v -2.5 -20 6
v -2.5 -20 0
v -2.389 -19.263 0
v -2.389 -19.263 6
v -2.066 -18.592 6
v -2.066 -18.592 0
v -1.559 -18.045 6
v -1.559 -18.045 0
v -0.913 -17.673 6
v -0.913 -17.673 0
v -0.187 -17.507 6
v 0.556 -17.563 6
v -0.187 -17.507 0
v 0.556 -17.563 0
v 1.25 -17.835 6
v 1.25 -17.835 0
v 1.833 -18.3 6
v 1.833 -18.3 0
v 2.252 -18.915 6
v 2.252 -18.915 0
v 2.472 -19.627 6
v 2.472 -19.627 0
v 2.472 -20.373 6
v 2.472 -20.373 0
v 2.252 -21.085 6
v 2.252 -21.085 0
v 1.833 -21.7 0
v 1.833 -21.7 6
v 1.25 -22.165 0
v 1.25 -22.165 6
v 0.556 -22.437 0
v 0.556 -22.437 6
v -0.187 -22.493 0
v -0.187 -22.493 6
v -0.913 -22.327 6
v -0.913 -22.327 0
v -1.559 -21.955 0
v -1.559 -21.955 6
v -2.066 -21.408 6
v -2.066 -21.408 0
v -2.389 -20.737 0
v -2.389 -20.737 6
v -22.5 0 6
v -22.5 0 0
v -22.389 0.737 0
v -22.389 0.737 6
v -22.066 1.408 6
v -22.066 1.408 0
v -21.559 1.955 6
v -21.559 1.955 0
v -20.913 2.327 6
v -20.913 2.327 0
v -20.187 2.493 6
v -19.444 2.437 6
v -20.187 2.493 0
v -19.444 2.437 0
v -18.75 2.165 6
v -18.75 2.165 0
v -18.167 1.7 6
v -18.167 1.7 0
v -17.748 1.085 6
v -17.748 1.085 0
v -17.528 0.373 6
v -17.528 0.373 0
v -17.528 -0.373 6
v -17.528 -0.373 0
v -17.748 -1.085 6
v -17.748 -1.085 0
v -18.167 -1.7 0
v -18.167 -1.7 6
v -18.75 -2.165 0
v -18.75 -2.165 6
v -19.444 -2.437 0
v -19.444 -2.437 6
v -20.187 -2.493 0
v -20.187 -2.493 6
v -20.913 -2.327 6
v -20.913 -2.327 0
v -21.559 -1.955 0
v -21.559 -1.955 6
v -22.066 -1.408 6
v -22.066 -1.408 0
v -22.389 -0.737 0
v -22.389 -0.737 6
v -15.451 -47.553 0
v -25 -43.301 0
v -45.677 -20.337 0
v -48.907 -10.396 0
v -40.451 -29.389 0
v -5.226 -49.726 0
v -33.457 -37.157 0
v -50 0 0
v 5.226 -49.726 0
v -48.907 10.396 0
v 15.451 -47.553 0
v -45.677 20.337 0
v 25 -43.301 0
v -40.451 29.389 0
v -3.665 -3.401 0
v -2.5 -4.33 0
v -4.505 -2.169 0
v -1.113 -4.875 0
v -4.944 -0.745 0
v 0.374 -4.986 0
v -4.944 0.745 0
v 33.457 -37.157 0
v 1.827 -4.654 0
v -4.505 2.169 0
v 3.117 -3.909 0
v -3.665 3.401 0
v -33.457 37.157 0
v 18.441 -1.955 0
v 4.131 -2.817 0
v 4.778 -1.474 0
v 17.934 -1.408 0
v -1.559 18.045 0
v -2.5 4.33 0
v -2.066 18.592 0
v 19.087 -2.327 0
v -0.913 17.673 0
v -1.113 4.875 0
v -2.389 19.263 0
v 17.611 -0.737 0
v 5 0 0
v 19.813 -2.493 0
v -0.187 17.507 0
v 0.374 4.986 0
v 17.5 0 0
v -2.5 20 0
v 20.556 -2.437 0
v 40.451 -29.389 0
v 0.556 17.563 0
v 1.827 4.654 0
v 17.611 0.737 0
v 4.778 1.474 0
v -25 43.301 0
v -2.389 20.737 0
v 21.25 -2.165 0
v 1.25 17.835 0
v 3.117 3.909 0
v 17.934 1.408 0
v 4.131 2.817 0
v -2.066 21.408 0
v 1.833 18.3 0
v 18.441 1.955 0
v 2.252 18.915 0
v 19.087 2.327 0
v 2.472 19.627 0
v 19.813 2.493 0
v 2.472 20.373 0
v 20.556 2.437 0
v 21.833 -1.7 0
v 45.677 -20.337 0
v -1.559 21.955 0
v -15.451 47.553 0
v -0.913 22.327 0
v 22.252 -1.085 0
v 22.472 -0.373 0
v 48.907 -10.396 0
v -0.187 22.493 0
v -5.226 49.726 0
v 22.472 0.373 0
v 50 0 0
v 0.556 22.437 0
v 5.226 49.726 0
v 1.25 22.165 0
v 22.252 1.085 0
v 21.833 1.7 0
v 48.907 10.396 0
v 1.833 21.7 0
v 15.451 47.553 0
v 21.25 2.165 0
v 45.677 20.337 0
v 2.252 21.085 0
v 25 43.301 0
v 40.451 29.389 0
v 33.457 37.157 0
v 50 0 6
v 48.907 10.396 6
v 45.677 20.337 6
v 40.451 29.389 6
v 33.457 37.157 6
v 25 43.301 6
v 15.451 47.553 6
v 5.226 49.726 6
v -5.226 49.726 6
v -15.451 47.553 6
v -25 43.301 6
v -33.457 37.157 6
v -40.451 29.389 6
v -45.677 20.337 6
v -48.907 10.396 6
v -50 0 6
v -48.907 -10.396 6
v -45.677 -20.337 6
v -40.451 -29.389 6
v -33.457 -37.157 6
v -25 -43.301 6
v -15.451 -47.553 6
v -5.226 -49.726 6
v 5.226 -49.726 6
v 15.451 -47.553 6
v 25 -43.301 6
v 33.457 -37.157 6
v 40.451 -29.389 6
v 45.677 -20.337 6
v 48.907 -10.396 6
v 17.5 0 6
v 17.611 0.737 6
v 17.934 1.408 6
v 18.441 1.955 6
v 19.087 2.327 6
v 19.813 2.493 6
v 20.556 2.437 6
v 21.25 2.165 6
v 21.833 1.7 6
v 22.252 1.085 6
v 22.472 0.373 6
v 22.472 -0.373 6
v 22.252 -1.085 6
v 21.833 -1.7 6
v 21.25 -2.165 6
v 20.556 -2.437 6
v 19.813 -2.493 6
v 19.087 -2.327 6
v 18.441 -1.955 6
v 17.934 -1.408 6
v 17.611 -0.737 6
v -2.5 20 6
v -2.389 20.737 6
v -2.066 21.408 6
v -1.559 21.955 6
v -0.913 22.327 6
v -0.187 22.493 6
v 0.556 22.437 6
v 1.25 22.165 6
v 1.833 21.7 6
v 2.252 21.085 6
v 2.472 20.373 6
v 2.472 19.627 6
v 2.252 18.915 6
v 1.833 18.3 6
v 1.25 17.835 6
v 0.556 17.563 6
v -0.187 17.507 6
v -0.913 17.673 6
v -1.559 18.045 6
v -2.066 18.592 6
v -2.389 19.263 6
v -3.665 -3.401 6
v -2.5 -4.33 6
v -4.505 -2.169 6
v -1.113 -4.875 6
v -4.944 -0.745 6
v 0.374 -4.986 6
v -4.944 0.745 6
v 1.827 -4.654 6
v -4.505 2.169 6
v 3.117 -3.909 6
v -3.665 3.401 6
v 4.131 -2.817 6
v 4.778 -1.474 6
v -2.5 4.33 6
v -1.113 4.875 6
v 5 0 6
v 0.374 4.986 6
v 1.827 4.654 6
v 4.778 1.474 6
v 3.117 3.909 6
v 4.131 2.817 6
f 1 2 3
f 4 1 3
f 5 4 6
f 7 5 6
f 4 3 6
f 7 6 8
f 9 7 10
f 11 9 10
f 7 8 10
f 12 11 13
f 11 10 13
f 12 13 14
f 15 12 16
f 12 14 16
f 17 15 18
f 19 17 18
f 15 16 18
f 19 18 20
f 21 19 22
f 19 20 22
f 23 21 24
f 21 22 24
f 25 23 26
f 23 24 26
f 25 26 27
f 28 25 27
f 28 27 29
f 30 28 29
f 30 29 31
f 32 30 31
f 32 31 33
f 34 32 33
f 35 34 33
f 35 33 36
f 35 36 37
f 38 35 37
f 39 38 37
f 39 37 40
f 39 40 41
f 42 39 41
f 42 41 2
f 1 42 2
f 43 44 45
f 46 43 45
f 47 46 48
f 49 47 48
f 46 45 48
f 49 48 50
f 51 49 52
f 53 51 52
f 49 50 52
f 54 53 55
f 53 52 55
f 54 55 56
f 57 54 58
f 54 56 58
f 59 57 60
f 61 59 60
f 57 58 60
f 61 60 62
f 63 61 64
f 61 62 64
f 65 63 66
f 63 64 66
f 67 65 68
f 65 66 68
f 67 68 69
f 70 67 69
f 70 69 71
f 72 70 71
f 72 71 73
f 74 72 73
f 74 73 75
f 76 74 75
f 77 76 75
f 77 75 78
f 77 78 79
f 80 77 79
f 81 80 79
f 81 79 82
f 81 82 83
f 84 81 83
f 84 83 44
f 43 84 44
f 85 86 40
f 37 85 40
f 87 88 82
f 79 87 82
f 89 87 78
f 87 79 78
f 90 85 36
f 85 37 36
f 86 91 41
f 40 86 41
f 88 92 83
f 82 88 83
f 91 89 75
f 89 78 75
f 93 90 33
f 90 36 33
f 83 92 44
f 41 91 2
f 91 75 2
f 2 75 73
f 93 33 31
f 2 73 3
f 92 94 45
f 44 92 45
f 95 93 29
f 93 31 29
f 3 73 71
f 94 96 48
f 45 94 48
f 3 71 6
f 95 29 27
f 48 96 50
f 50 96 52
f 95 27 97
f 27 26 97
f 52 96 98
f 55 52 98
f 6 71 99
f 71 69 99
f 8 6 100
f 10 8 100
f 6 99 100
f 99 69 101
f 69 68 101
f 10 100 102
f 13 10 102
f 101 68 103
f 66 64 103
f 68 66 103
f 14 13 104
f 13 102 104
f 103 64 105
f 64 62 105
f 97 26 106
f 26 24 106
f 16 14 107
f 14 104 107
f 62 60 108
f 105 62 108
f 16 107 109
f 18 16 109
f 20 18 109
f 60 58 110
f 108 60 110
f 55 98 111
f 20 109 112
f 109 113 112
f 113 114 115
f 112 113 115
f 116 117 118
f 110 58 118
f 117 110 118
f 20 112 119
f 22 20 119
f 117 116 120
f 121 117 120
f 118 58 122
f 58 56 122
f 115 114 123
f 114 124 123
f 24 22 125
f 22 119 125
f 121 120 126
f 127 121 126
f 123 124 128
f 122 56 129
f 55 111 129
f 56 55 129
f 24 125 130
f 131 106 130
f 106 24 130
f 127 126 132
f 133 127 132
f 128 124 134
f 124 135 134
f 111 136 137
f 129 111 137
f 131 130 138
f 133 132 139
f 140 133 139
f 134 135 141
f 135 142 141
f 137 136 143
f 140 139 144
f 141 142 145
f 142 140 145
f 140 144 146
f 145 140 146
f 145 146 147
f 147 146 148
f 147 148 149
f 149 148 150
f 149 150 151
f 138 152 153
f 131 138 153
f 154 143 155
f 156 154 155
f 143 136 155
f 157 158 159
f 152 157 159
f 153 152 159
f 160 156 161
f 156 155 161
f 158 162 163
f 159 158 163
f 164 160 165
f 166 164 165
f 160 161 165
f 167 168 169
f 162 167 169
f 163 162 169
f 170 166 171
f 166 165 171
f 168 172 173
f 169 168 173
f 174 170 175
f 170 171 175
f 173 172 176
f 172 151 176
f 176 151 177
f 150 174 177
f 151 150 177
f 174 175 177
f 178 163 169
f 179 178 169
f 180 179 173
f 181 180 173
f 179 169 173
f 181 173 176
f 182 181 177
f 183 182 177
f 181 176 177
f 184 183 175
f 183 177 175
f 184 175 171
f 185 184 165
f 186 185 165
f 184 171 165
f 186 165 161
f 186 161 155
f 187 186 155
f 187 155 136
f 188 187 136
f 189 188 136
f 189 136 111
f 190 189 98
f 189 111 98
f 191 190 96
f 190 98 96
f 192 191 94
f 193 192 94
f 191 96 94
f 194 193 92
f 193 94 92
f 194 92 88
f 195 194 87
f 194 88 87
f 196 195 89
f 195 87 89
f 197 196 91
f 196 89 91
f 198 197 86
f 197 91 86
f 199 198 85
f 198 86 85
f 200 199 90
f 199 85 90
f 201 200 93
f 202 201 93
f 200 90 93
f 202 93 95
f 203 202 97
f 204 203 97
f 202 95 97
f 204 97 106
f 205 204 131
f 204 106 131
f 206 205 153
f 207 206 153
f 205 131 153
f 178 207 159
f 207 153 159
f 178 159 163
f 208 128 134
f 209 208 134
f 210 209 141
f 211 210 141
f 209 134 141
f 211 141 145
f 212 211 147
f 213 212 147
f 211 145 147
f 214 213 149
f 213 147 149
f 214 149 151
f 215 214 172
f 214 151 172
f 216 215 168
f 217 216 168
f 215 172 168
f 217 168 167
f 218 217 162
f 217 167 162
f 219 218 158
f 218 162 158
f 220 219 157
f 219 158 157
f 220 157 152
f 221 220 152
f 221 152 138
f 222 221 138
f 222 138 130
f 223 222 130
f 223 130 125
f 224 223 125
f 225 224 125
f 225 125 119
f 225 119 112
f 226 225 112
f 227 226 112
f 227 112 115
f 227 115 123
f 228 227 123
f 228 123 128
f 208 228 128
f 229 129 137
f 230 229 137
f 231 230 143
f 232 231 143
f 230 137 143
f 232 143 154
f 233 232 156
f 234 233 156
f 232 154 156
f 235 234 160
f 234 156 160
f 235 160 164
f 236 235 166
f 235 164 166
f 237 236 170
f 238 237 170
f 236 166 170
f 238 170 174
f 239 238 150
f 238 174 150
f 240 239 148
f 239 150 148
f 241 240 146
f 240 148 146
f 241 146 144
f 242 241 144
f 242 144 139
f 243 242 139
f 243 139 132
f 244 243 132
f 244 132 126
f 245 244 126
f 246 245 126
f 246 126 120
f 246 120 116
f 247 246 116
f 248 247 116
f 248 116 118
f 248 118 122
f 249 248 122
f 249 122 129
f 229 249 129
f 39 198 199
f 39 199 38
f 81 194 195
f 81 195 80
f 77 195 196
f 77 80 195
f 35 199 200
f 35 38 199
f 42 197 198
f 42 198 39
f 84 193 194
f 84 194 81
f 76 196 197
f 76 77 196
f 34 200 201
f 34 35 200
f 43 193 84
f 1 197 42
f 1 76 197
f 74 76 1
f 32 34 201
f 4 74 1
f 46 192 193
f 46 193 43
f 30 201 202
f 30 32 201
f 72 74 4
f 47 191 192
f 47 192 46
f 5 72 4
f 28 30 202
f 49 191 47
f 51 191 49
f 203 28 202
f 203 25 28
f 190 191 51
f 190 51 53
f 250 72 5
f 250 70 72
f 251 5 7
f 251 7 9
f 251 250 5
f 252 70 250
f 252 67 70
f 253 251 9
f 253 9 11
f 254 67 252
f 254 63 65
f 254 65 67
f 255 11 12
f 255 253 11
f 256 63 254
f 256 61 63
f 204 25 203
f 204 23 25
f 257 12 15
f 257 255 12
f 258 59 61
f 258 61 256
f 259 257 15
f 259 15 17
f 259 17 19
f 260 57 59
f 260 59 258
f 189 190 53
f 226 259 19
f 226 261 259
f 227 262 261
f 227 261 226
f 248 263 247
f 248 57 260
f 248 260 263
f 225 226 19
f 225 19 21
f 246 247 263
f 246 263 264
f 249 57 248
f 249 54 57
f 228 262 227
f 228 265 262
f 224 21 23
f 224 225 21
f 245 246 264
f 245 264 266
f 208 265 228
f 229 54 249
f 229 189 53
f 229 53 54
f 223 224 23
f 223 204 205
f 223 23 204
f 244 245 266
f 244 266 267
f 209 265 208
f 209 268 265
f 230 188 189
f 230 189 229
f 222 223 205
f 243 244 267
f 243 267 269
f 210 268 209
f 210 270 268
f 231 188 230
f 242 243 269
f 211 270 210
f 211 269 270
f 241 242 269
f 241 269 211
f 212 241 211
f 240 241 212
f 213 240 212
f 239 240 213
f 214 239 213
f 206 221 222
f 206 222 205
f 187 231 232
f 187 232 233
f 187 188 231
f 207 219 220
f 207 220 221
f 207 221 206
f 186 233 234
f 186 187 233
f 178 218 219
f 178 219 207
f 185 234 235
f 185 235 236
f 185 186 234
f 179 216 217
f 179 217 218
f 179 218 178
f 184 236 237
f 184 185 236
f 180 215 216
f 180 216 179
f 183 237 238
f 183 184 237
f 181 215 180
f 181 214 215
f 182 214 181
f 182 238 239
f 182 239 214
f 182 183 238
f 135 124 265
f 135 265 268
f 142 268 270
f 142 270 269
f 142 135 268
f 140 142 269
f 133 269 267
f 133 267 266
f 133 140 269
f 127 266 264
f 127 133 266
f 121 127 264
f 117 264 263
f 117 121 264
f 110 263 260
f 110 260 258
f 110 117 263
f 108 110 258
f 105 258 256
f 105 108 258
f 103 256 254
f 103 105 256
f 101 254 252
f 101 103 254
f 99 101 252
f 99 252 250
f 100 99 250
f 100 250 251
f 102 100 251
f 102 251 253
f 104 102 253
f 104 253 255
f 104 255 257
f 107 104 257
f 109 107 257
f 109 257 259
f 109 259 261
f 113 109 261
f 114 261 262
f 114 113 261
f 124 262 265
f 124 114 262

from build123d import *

# Parameters (mm, degrees)
SKETCH1_R           = 50
SKETCH1_R_2         = 5
BOSS_EXTRUDE1_DEPTH = 6
SKETCH2_R           = 2.5
CUT_EXTRUDE1_DEPTH  = 7


with BuildPart() as part:
    # Sketch1 → Boss-Extrude1 (new body)
    with BuildSketch(Plane.XY):
        Circle(SKETCH1_R)
        Circle(SKETCH1_R_2, mode=Mode.SUBTRACT)
    extrude(amount=BOSS_EXTRUDE1_DEPTH)

    # Sketch2 → Cut-Extrude1 (cut, through all)
    with BuildSketch(Plane(origin=(0, 0, 0), x_dir=(-1, 0, 0), z_dir=(0, 0, -1))):
        with Locations((0, 20)):
            Circle(SKETCH2_R)
        with Locations((20, 0)):
            Circle(SKETCH2_R)
        with Locations((0, -20)):
            Circle(SKETCH2_R)
        with Locations((-20, 0)):
            Circle(SKETCH2_R)
    extrude(amount=-CUT_EXTRUDE1_DEPTH, mode=Mode.SUBTRACT)


solid = part.part
